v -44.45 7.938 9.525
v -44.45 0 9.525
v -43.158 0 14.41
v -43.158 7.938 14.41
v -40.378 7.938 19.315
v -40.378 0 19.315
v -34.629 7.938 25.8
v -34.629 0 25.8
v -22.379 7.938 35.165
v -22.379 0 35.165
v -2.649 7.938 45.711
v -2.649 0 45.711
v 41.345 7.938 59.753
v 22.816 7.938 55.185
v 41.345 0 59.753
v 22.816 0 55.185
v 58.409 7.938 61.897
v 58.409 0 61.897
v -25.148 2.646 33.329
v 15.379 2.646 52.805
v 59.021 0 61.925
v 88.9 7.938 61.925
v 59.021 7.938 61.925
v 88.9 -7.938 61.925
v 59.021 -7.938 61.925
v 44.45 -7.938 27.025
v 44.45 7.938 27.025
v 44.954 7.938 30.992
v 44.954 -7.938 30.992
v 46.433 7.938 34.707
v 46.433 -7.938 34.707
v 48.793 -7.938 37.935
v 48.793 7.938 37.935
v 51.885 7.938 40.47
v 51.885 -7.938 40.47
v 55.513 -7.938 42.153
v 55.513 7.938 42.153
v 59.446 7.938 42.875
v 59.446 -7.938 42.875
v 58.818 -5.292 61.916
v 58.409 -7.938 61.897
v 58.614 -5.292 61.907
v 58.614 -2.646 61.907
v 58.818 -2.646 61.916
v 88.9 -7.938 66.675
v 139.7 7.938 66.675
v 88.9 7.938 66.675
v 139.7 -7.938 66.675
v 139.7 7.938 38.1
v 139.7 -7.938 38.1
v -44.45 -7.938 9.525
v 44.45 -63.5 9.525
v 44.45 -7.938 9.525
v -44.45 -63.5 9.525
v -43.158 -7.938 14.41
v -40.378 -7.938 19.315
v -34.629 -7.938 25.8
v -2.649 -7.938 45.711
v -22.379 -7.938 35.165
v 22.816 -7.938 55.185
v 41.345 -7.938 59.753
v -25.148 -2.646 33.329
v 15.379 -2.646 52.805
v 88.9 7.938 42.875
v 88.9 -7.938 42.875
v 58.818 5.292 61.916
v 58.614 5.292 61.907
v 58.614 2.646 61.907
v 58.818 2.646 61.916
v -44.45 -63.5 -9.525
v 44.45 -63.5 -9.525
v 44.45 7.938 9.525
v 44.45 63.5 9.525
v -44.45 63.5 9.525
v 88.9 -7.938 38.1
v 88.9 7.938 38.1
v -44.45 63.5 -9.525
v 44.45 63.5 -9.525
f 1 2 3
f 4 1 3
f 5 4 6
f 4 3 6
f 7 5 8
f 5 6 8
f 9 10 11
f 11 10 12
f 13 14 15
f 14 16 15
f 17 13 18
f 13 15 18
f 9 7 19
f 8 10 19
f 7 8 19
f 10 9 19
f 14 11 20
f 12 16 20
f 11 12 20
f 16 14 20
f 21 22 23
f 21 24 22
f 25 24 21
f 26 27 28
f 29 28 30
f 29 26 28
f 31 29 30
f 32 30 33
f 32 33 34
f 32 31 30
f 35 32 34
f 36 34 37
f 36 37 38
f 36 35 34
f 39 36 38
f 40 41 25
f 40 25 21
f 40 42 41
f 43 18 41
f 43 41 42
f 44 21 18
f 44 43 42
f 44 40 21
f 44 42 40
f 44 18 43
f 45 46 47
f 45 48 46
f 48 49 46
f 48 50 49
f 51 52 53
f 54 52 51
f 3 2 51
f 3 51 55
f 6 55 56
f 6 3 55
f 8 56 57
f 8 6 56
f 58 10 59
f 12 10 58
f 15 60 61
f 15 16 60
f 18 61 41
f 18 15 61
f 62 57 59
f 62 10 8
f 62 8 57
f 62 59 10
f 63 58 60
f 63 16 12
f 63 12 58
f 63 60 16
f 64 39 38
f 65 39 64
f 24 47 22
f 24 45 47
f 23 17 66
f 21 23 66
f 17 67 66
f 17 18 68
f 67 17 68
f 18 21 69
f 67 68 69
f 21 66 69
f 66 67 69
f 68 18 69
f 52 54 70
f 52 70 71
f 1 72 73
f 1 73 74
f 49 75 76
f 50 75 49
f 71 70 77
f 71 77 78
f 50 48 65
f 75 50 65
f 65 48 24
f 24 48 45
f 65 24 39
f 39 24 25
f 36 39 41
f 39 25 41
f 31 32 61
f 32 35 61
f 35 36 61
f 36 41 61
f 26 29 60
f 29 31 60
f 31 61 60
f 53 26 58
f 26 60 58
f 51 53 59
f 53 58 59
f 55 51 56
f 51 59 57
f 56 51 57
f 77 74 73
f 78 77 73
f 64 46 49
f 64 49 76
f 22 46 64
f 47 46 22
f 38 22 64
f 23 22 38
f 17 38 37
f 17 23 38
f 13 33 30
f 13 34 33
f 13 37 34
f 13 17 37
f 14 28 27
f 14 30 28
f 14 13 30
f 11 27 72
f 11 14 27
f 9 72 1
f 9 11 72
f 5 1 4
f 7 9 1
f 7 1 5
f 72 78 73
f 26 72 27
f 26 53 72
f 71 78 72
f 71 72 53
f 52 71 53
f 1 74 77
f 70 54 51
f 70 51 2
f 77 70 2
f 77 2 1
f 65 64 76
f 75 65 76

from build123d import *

# Parameters (mm, degrees)
F1_DEPTH = 63.5
F0_W     = 25.4
F0_H     = 4.7498
F0_H_2   = 4.7752
F2_DEPTH = 7.9375


with BuildPart() as f1:
    # F0 (on Front) → F1 (new body, symmetric)
    with BuildSketch(Plane.XZ):
        Polygon((25.4, 9.525), (-44.45, 9.525), (-44.45, -9.525), (44.45, -9.525), (44.45, 9.525), align=None)
    extrude(amount=F1_DEPTH, both=True)

    # F0 (on Front) → F2 (join, symmetric)
    with BuildSketch(Plane.XZ):
        with BuildLine():
            add(Edge.make_bspline(
                [(-44.45, 9.525), (-42.0019178226, 33.4759426415), (20.3692746454, 60.014643523), (58.4090455621, 61.8969537879)],
                knots=[0, 0, 0, 0, 115.3620955336, 115.3620955336, 115.3620955336, 115.3620955336], degree=3))
            Line((-44.45, 9.525), (25.4, 9.525))
            Line((25.4, 9.525), (25.4, 27.0245471661))
            ThreePointArc((25.4, 27.0245471661), (34.9609473492, 51.0333051125), (58.4090455621, 61.8969537879))
        make_face()
        Polygon((114.3, 66.675), (114.3, 61.9252), (114.3, 52.3875), (114.3, 42.8752), (114.3, 38.1), (139.7, 38.1), (139.7, 66.675), align=None)
        Polygon((114.3, 61.9252), (88.9, 61.9252), (88.9, 42.8752), (114.3, 42.8752), (114.3, 52.3875), align=None)
        with Locations((101.6, 64.3001)):
            Rectangle(F0_W, F0_H)
        with Locations((101.6, 40.4876)):
            Rectangle(F0_W, F0_H_2)
        with BuildLine():
            Line((25.4, 27.0245471661), (25.4, 9.525))
            Line((25.4, 9.525), (44.45, 9.525))
            Line((44.45, 9.525), (44.45, 27.0245471661))
            ThreePointArc((44.45, 27.0245471661), (48.793134536, 37.9347123308), (59.446120179, 42.8752))
            Line((59.446120179, 42.8752), (88.9, 42.8752))
            Line((88.9, 42.8752), (88.9, 61.9252))
            Line((88.9, 61.9252), (59.0211377493, 61.9252))
            add(Edge.make_bspline(
                [(58.4090455621, 61.8969537879), (58.6137855205, 61.9070848721), (58.8178206284, 61.9165016921), (59.0211377493, 61.9252)],
                knots=[115.3620955336, 115.3620955336, 115.3620955336, 115.3620955336, 115.9830043893, 115.9830043893, 115.9830043893, 115.9830043893], degree=3))
            ThreePointArc((58.4090455621, 61.8969537879), (34.9609473492, 51.0333051125), (25.4, 27.0245471661))
        make_face()
    extrude(amount=F2_DEPTH, both=True)


solid = f1.part
